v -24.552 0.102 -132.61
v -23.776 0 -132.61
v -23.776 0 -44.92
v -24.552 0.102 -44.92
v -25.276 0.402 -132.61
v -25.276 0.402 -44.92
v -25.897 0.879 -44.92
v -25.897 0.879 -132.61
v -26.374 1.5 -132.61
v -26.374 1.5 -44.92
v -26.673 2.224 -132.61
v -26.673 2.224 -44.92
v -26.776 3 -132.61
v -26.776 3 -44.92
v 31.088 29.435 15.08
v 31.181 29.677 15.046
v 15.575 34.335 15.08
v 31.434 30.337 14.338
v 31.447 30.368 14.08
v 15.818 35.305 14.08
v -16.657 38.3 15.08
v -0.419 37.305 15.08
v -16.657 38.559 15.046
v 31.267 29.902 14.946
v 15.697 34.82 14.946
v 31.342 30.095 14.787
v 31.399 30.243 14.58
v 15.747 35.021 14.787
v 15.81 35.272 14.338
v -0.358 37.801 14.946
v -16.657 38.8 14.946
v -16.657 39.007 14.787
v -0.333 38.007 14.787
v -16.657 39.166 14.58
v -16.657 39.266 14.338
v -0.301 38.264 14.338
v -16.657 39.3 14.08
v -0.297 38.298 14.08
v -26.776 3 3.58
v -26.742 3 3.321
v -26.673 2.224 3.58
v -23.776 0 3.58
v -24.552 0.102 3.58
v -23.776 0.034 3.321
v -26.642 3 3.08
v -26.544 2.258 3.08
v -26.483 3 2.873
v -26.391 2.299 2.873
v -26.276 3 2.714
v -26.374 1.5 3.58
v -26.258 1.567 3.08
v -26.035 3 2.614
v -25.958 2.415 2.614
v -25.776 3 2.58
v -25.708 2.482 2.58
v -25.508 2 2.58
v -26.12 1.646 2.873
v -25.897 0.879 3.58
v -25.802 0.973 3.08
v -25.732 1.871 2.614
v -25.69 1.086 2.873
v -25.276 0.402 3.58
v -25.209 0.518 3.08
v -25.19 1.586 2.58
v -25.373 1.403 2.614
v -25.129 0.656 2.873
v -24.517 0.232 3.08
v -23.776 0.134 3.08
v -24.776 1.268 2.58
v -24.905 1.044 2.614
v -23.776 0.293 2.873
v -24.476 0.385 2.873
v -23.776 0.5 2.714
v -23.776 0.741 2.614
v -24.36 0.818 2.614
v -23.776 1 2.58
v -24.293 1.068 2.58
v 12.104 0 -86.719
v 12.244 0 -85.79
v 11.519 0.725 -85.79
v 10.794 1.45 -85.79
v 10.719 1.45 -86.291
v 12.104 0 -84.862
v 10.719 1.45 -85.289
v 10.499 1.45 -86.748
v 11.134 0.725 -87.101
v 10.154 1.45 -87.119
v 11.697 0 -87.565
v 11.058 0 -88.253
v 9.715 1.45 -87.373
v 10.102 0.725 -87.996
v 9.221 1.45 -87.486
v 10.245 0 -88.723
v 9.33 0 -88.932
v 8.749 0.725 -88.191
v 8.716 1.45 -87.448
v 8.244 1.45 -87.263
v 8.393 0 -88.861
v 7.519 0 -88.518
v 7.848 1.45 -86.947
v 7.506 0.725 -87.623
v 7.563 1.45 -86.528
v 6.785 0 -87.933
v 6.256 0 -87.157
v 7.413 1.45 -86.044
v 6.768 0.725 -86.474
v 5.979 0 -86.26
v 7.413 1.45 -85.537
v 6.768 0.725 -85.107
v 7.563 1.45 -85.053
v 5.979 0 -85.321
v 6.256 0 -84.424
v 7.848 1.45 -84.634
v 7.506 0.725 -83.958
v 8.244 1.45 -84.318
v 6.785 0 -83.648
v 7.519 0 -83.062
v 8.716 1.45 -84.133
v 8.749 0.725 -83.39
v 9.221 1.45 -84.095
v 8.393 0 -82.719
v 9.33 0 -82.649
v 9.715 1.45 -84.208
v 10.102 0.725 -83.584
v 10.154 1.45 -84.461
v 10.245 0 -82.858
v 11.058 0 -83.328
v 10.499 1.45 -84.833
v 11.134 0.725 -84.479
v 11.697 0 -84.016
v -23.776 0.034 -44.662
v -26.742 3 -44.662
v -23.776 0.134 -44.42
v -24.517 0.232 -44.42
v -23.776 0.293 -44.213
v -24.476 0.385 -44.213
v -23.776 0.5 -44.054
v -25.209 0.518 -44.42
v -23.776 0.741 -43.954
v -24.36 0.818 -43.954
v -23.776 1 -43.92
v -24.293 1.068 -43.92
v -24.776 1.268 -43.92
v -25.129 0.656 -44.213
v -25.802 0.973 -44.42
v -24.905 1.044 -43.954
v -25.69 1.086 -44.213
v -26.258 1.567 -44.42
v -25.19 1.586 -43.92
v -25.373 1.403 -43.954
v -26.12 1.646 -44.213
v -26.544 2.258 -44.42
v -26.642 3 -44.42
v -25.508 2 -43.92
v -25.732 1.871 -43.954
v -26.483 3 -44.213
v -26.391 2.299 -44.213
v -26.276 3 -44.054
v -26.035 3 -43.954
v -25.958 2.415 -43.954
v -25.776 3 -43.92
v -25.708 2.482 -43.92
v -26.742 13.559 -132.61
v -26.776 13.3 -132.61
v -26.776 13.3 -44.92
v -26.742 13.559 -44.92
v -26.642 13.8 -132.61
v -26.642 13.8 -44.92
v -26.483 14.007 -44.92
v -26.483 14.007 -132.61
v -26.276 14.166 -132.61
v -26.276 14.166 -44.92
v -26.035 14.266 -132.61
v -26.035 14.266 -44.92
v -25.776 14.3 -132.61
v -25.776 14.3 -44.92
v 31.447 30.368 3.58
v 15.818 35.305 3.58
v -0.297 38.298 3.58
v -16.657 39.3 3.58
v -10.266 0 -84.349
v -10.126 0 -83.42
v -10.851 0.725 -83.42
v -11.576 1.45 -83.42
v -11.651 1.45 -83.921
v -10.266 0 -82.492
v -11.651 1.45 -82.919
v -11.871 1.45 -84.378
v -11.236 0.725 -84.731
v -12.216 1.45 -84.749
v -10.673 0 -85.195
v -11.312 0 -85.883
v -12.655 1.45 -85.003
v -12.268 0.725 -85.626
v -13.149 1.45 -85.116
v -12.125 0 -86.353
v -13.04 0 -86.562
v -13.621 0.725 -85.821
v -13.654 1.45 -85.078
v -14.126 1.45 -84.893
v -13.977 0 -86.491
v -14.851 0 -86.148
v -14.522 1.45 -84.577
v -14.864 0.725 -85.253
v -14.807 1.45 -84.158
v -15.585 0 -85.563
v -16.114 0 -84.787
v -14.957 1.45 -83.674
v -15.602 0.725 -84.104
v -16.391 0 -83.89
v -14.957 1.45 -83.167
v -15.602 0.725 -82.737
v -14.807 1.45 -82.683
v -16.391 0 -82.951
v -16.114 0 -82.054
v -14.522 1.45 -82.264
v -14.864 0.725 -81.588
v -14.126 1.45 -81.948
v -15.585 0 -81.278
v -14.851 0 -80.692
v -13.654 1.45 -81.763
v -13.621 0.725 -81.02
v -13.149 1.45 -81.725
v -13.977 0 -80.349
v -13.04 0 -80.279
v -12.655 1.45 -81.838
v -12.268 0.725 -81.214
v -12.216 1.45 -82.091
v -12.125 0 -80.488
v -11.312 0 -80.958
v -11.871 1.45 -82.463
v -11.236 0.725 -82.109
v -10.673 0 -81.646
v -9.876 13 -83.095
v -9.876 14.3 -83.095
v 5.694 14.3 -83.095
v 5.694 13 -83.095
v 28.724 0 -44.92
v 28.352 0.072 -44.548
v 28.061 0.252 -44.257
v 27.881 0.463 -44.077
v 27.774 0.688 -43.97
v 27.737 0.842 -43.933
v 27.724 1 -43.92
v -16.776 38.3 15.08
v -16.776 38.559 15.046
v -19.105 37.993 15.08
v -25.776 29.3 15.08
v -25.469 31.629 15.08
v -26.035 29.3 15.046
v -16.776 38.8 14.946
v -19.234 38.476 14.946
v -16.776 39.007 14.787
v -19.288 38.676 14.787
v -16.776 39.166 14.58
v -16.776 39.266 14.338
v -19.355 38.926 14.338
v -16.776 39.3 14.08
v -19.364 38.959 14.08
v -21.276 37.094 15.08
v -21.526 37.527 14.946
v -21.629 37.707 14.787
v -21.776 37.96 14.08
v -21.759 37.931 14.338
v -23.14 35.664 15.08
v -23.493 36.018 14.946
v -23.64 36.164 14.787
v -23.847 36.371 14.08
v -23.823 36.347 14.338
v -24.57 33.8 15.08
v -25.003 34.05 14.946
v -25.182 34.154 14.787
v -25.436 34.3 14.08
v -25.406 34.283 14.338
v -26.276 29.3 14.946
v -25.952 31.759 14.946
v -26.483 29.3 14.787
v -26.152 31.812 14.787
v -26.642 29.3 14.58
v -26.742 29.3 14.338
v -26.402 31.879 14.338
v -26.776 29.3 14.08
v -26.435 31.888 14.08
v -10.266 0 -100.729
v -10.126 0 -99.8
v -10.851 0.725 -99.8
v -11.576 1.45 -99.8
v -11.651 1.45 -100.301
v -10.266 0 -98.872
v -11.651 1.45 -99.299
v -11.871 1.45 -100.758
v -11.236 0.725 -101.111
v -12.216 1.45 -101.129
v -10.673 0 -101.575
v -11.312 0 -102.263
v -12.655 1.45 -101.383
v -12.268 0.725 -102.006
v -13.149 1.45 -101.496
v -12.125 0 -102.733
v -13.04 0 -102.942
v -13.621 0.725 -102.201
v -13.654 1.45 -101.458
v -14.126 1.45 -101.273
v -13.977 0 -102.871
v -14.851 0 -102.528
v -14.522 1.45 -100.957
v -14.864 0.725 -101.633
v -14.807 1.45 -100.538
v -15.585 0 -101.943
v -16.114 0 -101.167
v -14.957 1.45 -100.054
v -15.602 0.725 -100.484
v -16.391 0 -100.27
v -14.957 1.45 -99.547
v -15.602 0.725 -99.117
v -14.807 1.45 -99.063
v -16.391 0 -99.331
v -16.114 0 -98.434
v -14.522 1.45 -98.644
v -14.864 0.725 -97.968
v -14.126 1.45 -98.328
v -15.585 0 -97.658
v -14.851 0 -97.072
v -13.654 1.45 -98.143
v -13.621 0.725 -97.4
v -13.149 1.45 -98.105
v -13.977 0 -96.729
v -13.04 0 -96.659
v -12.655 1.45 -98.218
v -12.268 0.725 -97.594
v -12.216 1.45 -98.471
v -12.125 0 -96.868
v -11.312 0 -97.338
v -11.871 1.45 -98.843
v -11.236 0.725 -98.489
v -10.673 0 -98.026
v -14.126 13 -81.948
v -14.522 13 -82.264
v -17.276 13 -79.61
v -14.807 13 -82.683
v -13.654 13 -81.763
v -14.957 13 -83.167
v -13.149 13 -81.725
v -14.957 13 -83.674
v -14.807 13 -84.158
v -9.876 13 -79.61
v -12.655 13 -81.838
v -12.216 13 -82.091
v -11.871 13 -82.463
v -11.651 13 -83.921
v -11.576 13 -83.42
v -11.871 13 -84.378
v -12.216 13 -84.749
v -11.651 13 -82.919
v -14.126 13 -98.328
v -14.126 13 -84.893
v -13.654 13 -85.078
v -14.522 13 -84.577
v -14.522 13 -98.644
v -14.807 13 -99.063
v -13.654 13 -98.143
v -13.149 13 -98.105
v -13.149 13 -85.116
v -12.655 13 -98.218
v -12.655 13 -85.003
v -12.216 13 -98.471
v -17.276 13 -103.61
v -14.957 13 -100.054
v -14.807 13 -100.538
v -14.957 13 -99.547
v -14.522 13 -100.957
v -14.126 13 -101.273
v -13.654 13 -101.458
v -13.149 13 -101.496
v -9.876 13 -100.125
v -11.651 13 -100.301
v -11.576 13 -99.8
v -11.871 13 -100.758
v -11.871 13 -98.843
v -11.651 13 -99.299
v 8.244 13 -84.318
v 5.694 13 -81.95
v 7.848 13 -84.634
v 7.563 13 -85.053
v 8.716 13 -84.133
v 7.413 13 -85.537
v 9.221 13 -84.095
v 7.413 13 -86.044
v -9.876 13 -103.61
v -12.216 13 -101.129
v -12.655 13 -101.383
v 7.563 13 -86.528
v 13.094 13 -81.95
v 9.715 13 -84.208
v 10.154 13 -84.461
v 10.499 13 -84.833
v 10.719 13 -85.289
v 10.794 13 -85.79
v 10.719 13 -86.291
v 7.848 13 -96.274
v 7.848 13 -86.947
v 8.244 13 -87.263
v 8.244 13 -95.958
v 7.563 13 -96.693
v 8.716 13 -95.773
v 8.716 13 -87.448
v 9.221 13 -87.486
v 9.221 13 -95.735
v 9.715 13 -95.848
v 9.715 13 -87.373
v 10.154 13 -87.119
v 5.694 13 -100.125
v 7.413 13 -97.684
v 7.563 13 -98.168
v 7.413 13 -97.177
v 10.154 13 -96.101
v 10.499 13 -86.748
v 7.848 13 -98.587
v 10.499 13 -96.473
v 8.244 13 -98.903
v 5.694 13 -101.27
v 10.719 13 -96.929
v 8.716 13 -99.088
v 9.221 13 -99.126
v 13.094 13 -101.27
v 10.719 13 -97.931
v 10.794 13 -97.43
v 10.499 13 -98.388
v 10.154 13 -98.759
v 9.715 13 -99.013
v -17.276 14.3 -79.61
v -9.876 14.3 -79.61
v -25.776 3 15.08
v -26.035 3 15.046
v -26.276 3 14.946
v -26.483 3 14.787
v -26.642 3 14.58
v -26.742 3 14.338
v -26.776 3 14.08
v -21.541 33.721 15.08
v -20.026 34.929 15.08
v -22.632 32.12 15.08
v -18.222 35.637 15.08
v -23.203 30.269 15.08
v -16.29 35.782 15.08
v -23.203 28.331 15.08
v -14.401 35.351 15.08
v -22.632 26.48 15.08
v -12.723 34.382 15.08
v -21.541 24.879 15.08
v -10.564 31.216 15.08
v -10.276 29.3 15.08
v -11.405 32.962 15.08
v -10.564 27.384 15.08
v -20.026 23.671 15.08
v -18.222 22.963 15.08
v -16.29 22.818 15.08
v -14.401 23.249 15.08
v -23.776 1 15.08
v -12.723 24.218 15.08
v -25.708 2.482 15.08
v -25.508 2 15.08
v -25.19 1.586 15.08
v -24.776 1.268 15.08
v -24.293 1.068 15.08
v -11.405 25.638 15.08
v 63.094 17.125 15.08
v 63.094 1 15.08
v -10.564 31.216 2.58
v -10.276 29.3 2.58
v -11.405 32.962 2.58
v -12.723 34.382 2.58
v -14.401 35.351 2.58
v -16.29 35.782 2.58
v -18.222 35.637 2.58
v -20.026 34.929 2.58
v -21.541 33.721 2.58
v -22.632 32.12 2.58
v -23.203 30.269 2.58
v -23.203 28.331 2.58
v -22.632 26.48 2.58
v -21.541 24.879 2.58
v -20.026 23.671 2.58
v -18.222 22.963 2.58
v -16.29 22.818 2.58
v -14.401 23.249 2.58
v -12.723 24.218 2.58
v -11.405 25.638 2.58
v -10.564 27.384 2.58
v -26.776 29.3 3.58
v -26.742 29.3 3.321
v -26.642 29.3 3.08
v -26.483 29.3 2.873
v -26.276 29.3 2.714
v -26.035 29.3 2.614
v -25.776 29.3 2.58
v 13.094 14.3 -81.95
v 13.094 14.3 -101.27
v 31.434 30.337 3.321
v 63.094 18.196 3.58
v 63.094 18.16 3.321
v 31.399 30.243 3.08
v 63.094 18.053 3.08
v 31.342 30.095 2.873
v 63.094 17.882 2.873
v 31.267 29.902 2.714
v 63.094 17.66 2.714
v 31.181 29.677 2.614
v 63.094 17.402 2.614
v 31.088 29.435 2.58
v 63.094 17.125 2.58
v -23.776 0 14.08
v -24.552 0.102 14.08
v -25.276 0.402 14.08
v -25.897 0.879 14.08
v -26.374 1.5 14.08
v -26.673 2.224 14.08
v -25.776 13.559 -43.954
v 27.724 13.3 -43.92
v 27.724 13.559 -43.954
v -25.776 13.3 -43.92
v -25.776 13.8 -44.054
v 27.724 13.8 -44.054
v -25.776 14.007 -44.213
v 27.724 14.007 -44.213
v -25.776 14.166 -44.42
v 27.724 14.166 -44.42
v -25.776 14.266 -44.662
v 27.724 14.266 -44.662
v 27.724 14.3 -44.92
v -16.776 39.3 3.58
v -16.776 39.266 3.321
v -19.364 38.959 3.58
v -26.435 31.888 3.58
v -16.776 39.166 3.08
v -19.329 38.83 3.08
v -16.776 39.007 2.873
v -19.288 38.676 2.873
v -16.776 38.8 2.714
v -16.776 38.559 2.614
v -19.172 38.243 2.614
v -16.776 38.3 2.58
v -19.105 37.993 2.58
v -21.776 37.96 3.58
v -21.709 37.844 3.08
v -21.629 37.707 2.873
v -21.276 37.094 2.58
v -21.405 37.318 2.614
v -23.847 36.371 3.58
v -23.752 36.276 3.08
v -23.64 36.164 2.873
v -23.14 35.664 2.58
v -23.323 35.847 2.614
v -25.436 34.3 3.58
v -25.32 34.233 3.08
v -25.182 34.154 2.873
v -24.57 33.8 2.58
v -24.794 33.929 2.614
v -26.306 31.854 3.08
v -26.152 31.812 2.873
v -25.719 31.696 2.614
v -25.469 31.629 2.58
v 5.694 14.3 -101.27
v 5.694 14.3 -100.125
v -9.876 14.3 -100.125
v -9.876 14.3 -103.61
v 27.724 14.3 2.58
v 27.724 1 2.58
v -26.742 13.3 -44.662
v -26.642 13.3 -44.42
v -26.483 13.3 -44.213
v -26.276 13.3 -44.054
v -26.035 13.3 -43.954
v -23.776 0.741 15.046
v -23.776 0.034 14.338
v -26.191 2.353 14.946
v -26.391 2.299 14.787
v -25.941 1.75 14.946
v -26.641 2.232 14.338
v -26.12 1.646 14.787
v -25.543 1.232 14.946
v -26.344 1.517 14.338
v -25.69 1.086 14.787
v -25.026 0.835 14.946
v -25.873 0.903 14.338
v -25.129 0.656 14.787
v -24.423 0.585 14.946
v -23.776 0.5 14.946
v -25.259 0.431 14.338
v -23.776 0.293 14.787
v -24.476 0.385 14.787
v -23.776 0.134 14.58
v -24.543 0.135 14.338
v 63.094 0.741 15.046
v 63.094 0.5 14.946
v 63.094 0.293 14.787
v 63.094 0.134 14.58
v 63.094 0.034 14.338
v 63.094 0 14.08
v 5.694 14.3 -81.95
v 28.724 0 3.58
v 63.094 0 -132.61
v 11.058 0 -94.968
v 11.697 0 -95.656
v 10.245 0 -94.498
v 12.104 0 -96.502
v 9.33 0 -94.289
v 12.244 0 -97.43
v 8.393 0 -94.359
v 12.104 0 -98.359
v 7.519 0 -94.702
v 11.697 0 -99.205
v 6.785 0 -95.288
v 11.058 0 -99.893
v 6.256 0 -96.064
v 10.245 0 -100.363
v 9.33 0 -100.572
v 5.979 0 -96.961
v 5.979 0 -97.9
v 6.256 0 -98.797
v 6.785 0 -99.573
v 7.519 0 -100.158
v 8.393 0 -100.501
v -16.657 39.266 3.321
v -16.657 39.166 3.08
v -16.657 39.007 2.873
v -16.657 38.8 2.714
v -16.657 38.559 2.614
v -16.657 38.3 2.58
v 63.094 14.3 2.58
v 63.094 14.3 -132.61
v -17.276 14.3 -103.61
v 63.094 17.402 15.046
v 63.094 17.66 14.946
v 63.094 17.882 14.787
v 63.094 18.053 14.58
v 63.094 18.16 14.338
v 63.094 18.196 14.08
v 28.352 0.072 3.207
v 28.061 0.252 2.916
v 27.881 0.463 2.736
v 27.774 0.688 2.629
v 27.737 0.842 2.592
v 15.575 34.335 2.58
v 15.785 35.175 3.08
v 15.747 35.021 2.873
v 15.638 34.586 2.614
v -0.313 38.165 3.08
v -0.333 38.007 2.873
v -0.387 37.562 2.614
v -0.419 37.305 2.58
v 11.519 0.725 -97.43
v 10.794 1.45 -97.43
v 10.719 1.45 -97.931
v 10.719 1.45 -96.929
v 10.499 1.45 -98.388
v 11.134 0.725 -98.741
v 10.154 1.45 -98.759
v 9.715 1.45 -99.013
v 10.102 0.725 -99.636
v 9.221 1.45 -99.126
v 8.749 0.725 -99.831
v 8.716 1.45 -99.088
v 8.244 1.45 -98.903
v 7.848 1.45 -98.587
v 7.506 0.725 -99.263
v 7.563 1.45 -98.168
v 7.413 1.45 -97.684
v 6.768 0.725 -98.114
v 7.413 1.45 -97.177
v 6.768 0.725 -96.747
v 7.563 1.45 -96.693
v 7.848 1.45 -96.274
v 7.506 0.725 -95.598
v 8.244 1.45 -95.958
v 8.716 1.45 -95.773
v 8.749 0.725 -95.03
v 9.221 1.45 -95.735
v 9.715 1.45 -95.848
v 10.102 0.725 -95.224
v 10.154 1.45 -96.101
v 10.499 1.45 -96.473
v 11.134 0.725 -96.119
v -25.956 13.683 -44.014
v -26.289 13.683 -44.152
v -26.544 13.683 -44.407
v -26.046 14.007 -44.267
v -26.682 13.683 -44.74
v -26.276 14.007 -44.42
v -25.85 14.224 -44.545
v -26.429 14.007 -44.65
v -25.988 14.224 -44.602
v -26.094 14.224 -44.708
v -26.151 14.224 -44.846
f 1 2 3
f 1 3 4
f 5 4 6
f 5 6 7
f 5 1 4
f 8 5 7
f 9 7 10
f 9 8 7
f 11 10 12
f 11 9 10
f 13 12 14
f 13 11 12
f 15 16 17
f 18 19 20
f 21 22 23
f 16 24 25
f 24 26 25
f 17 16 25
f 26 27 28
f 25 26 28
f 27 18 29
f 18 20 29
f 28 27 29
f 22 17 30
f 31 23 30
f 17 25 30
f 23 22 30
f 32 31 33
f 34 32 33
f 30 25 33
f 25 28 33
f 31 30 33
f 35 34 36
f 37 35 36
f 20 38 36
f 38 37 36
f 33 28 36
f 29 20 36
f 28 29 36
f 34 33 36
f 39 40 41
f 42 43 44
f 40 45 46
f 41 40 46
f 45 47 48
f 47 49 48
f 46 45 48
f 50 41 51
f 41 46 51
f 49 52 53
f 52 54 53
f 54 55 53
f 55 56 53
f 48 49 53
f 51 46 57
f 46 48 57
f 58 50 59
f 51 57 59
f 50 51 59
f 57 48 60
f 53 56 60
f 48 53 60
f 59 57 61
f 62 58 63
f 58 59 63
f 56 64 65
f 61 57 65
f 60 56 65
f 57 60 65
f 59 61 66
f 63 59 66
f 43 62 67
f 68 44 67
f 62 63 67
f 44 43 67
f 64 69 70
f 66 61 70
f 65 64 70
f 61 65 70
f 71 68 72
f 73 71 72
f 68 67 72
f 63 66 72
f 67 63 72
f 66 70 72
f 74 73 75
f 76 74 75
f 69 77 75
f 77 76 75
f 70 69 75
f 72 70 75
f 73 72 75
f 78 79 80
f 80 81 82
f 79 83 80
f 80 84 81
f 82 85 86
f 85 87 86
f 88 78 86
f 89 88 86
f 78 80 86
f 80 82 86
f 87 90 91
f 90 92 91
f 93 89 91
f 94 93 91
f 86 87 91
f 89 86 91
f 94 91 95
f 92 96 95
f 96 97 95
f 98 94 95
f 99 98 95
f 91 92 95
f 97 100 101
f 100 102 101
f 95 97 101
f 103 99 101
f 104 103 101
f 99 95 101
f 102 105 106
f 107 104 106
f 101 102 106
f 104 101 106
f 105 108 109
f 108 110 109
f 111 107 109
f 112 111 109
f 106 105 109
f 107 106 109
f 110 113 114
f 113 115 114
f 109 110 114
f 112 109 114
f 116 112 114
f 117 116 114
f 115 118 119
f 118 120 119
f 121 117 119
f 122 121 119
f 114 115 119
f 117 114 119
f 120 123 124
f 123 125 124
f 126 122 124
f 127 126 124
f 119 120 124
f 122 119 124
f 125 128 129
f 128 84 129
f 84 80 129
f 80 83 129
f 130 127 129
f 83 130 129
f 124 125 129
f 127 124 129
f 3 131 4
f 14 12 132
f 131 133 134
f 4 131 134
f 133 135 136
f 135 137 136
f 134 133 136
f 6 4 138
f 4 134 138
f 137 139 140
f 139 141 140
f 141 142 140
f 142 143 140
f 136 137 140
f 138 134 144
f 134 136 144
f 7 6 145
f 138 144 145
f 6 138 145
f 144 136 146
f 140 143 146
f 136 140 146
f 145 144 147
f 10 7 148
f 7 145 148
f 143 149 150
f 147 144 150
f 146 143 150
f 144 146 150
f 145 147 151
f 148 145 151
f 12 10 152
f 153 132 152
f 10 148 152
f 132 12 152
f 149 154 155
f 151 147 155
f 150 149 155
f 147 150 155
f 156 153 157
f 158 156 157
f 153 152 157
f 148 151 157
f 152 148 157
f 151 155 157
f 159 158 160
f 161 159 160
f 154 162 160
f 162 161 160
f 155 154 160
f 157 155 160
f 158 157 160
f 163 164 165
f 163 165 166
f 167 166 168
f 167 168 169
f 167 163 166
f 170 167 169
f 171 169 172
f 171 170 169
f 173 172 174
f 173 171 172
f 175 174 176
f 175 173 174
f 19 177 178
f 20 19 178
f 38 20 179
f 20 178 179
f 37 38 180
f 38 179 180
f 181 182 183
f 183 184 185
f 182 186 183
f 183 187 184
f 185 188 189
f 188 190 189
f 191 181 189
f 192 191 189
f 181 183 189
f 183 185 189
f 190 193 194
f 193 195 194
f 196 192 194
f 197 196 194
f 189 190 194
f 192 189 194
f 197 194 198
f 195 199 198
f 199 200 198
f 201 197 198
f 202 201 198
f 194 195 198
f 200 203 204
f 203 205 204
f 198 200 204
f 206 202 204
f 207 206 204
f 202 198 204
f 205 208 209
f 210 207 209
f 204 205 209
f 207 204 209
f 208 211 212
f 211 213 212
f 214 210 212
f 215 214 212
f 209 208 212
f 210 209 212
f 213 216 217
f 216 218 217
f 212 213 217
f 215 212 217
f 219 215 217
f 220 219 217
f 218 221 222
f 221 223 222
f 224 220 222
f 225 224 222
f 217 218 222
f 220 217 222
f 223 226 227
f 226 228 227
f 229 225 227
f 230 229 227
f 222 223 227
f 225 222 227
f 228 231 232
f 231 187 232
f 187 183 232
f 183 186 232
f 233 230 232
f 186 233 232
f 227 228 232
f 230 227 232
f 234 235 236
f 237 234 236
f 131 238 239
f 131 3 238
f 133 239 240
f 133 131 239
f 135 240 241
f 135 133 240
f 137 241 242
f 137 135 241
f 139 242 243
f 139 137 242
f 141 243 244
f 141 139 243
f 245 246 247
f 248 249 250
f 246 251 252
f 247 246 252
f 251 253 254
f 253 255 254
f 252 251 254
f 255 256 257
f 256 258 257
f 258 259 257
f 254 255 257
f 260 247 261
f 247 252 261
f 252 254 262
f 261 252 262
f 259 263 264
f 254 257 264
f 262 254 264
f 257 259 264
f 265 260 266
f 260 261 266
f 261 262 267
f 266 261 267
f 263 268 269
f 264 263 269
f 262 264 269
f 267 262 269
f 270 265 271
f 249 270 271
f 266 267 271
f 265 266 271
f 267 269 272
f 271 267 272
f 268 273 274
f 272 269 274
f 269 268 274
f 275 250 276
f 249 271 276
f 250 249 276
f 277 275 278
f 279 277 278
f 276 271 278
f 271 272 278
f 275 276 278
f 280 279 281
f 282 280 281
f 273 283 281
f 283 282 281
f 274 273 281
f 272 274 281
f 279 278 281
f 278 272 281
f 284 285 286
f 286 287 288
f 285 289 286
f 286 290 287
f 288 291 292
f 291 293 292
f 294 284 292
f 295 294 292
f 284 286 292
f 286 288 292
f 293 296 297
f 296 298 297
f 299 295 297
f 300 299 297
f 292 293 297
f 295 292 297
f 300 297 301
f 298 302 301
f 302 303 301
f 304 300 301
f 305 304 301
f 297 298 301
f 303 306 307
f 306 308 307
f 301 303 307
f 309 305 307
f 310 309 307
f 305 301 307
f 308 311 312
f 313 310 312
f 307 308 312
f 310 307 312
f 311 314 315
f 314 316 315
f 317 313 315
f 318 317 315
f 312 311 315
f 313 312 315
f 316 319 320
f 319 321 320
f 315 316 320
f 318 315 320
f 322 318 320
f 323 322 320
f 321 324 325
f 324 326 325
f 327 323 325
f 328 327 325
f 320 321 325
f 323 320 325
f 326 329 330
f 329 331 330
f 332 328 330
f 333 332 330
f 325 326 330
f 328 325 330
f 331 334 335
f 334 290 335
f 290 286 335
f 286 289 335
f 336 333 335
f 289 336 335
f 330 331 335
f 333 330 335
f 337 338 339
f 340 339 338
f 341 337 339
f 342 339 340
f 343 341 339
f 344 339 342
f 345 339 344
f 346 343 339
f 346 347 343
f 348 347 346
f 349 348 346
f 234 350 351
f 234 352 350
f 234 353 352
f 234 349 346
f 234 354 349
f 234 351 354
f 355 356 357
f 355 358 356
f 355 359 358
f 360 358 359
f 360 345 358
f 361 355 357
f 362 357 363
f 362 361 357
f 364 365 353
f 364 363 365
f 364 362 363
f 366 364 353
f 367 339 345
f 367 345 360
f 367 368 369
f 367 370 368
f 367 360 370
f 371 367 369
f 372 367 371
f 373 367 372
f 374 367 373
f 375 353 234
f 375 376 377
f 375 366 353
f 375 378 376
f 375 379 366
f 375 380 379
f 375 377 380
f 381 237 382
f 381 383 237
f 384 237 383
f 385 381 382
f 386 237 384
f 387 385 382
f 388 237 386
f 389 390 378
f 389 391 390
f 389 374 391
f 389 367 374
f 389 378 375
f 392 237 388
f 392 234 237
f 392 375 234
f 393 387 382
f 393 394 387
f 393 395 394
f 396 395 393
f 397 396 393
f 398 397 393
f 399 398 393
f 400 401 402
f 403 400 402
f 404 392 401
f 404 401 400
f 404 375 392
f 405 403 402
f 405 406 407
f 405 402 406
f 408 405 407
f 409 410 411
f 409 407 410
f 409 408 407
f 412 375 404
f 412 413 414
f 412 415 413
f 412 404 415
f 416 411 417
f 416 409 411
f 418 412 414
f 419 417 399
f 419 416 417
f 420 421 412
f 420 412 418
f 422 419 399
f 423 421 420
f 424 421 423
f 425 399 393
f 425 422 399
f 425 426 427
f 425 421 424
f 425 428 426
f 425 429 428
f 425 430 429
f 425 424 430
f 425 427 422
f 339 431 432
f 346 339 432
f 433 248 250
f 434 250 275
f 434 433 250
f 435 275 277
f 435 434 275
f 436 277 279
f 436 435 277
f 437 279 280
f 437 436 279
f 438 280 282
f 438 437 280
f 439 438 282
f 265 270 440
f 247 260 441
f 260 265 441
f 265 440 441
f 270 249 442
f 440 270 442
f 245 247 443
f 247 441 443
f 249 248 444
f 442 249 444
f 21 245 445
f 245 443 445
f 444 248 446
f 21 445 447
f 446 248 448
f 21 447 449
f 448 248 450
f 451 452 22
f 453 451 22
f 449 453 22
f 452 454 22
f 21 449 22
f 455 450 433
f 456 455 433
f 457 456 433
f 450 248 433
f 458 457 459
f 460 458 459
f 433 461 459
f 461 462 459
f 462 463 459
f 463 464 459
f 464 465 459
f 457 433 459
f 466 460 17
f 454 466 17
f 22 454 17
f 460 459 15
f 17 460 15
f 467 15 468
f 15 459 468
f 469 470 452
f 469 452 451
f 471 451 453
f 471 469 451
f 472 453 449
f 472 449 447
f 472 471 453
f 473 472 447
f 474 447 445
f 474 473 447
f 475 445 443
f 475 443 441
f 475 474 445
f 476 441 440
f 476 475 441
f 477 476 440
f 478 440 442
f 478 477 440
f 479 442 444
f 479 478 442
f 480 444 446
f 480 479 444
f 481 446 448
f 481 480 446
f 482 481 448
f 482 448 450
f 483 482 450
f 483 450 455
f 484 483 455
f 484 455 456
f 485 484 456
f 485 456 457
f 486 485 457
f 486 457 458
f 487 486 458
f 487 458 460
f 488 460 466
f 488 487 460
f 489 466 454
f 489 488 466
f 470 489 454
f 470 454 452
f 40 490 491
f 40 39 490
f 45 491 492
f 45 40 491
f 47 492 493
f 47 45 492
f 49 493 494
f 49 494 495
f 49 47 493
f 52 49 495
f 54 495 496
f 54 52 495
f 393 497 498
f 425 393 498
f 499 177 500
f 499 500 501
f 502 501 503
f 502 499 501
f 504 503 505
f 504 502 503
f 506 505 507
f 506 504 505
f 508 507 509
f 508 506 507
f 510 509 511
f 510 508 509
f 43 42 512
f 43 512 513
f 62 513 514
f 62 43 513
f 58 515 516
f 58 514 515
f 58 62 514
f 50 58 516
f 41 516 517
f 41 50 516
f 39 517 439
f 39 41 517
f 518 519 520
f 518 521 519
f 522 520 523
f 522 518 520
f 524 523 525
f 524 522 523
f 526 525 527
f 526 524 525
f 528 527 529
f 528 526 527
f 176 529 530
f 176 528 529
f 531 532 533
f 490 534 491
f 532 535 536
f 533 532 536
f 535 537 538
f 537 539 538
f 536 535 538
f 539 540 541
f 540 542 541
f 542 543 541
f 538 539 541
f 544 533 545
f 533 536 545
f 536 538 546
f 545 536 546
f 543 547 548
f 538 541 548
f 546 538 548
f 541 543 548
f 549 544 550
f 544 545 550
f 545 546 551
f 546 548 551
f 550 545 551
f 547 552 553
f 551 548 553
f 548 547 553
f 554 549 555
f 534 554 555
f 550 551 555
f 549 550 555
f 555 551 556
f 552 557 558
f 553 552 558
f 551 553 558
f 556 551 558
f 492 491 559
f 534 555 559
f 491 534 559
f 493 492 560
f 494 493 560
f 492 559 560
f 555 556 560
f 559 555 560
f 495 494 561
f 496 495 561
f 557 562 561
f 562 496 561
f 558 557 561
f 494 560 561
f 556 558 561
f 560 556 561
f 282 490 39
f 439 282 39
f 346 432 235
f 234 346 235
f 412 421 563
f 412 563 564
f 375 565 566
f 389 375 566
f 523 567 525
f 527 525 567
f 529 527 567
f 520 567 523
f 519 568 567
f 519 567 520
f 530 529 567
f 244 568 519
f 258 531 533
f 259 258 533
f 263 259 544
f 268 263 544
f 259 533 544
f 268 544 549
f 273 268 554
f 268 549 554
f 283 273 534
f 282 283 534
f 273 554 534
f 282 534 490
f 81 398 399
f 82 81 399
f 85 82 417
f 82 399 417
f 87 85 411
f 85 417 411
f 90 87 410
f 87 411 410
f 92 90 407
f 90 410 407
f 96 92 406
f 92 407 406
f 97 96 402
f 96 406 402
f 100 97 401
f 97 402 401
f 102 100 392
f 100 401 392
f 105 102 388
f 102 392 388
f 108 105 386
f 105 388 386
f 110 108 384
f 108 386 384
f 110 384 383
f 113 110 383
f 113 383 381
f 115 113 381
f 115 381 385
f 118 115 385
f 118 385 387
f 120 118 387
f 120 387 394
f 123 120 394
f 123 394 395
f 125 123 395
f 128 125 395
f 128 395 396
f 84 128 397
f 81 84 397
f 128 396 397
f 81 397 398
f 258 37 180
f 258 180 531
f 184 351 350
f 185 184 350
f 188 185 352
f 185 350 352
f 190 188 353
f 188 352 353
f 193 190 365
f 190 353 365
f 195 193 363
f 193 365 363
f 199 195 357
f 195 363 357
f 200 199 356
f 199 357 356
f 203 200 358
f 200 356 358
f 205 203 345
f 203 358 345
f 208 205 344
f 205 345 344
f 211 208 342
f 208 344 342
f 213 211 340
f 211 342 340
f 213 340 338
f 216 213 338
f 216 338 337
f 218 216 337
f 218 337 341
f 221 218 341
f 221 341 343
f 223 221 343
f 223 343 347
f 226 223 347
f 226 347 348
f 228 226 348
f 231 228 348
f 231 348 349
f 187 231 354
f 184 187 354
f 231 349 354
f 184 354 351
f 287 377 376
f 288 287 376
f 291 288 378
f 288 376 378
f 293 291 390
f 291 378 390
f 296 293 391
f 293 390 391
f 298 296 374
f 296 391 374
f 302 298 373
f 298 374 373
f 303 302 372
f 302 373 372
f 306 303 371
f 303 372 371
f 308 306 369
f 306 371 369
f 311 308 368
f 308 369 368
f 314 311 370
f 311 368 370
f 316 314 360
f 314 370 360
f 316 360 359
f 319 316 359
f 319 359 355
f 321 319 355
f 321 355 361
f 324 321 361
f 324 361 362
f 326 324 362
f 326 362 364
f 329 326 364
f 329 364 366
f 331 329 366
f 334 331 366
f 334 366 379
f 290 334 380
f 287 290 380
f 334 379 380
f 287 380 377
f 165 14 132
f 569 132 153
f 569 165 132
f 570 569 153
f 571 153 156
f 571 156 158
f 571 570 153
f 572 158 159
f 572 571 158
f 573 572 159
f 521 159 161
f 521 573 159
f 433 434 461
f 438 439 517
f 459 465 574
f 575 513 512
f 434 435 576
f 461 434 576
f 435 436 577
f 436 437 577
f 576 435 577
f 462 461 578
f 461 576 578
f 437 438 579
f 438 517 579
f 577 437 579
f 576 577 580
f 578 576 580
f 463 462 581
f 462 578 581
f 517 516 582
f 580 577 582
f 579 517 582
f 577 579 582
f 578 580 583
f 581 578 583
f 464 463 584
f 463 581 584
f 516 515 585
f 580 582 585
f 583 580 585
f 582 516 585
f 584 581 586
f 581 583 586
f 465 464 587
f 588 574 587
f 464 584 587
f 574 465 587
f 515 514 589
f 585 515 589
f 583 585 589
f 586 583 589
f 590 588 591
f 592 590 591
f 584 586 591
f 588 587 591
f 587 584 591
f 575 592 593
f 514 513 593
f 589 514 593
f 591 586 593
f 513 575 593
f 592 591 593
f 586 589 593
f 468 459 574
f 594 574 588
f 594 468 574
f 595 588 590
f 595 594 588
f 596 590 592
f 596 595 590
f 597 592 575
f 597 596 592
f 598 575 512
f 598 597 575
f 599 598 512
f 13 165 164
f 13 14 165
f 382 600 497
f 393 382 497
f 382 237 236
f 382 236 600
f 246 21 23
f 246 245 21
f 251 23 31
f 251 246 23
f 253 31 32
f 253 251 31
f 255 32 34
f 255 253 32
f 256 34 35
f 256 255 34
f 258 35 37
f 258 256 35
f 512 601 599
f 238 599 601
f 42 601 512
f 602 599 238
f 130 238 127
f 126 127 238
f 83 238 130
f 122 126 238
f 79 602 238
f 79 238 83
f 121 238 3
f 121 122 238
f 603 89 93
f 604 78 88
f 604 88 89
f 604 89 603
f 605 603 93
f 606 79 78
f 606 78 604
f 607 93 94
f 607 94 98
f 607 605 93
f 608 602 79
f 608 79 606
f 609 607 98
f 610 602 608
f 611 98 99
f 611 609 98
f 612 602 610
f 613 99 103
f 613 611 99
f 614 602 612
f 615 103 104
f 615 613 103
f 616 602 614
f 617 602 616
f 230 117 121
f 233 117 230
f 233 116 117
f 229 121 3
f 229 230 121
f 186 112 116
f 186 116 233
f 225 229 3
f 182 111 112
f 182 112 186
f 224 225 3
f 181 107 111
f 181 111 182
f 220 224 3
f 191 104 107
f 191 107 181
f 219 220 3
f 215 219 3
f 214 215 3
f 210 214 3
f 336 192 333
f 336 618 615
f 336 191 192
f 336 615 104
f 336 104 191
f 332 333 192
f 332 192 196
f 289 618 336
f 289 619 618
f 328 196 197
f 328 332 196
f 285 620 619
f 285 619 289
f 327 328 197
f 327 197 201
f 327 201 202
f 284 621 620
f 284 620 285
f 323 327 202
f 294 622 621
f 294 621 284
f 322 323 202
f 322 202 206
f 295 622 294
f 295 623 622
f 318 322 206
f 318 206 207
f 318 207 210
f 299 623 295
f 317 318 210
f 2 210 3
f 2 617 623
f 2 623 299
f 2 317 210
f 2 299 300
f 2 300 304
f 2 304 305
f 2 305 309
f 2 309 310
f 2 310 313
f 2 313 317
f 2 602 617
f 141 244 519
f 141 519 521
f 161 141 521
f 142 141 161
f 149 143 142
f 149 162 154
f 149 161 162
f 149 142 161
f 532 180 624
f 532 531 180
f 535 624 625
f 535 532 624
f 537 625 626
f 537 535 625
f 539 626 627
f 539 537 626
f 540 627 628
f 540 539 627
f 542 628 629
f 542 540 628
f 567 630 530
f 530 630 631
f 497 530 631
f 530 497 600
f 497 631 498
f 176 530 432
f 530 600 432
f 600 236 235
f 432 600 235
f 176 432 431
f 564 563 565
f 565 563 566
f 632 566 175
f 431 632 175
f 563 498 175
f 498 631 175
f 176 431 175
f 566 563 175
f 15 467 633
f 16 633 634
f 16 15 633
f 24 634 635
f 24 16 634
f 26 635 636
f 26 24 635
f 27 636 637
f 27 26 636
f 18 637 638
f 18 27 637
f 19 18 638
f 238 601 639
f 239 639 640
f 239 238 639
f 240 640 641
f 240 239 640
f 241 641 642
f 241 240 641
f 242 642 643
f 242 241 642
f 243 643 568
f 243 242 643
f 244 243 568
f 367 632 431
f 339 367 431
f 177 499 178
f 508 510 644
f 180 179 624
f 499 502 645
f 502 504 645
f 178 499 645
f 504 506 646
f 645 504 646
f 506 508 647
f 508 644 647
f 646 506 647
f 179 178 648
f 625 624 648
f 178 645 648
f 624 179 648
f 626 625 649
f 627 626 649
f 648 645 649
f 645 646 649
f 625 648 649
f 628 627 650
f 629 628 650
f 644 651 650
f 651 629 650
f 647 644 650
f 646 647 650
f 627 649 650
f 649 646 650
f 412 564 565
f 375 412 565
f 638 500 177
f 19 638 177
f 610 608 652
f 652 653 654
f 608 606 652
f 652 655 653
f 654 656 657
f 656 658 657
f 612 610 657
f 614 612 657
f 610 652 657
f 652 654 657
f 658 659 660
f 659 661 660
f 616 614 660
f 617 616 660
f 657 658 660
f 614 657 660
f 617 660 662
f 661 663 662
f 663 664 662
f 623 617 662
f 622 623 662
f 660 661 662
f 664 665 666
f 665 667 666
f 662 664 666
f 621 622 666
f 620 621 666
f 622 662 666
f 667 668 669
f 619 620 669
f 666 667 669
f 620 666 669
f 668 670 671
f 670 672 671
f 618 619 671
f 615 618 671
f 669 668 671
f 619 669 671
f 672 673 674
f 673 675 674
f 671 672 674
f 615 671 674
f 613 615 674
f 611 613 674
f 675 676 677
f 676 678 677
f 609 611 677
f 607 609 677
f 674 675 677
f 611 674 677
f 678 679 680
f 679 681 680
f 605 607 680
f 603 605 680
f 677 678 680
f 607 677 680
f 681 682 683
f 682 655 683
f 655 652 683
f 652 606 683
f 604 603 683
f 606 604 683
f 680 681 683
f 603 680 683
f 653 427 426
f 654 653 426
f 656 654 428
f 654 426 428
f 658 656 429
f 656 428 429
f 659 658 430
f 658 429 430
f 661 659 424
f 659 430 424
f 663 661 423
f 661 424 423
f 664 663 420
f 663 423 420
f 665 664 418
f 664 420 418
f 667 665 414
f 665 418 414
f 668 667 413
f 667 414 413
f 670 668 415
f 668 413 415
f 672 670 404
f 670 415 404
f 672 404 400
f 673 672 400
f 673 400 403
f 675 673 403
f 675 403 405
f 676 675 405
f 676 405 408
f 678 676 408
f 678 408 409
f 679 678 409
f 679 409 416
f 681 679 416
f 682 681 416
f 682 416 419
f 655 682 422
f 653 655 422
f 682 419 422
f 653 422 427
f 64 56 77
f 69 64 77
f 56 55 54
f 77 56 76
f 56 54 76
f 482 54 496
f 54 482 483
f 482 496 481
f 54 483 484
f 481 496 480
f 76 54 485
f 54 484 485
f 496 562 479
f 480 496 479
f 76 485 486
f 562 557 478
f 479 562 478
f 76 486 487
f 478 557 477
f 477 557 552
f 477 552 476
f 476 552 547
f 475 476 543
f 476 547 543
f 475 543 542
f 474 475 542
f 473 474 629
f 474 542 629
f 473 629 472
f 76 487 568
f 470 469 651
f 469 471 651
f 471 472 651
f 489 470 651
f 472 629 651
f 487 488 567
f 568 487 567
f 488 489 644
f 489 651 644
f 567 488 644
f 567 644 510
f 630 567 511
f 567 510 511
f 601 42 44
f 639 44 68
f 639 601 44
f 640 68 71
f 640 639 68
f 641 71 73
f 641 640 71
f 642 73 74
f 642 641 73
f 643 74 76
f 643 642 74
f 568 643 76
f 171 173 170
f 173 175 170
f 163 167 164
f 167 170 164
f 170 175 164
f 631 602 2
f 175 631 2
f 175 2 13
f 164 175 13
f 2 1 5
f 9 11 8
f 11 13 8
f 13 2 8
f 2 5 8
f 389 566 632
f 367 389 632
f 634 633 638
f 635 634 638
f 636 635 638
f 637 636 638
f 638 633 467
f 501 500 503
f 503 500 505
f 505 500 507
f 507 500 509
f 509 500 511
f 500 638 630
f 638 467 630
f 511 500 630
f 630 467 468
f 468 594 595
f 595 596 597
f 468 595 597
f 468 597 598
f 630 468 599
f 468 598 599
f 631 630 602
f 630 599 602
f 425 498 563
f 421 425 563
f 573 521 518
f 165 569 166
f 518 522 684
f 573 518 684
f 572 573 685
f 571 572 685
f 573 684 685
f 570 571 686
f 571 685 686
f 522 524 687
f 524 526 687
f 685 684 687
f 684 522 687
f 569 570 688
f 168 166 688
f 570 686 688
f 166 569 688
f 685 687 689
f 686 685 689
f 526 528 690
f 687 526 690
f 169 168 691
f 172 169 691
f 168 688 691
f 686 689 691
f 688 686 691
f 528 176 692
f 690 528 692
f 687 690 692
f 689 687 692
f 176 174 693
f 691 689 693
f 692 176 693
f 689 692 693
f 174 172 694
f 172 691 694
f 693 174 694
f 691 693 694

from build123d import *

# Parameters (mm, degrees)
BOSS_EXTRUDE1_DEPTH                             = 14.3
SKETCH2_R                                       = 1.5
CUT_EXTRUDE1_DEPTH                              = 1.3
CSK_FOR_M3_OVAL_HEAD_MACHINE_SCREW1_D           = 3.4
CSK_FOR_M3_OVAL_HEAD_MACHINE_SCREW1_CSINK_D     = 6.3
CSK_FOR_M3_OVAL_HEAD_MACHINE_SCREW1_CSINK_ANGLE = 90
BOSS_EXTRUDE2_START                             = -12.5
SKETCH8_R                                       = 6.5
BOSS_EXTRUDE2_DEPTH                             = 12.5
SKETCH14_W                                      = 40
SKETCH14_H                                      = 74
BOSS_EXTRUDE4_DEPTH                             = 25
CUT_EXTRUDE3_DEPTH                              = 4
M5_CLEARANCE_HOLE1_D                            = 5.5
FILLET1_R                                       = 4
FILLET1_OF_MIRROR3_R                            = 4
FILLET2_R                                       = 7
FILLET4_R                                       = 3
FILLET5_R                                       = 3
FILLET6_R                                       = 3
FILLET7_R                                       = 1
FILLET8_R                                       = 1
FILLET9_R                                       = 1
FILLET10_R                                      = 1
FILLET11_R                                      = 1
SKETCH21_W                                      = 13
SKETCH21_H                                      = 3.5
BOSS_EXTRUDE5_DEPTH                             = 33
CUT_EXTRUDE4_DEPTH                              = 17
CSK_FOR_M3_FLAT_HEAD_MACHINE_SCREW1_D           = 3.4
CSK_FOR_M3_FLAT_HEAD_MACHINE_SCREW1_CSINK_D     = 6.3
CSK_FOR_M3_FLAT_HEAD_MACHINE_SCREW1_CSINK_ANGLE = 90
CUT_EXTRUDE5_DEPTH                              = 434.079434689


with BuildPart() as part:
    # Sketch1 → Boss-Extrude1 (new body)
    with BuildSketch(Plane(origin=(0, 0, 0), x_dir=(1, 0, 0), z_dir=(0, 1, 0))):
        Polygon((27.724299065, -2.579662371), (27.724299065, 43.920337629), (-26.775700935, 43.920337629), (-26.775700935, 230.920337629), (27.724299065, 230.920337629), (27.724299065, 277.420337629), (-26.775700935, 277.420337629), (-26.775700935, 289.920337629), (318.224299065, 289.920337629), (318.224299065, -15.079662371), (-26.775700935, -15.079662371), (-26.775700935, -2.579662371), align=None)
    extrude(amount=BOSS_EXTRUDE1_DEPTH)

    # Sketch2 → Cut-Extrude1 (cut)
    # profile 1 of 2: a face of its own
    with BuildSketch(Plane(origin=(0, 14.3, 0), x_dir=(1, 0, 0), z_dir=(0, 1, 0))):
        Polygon((5.694299065, 191.745337629), (-9.875700935, 191.745337629), (-9.875700935, 195.230337629), (-17.275700935, 195.230337629), (-17.275700935, 171.230337629), (-9.875700935, 171.230337629), (-9.875700935, 174.715337629), (5.694299065, 174.715337629), (5.694299065, 173.570337629), (13.094299065, 173.570337629), (13.094299065, 192.890337629), (5.694299065, 192.890337629), align=None)
        with Locations(Location((-13.275700935, 191.420337629, 0), (0, 0, 270))):
            Circle(SKETCH2_R, mode=Mode.SUBTRACT)
        with Locations(Location((-13.275700935, 175.040337629, 0), (0, 0, 270))):
            Circle(SKETCH2_R, mode=Mode.SUBTRACT)
        with Locations(Location((9.094299065, 189.050337629, 0), (0, 0, 270))):
            Circle(SKETCH2_R, mode=Mode.SUBTRACT)
        with Locations(Location((9.094299065, 177.410337629, 0), (0, 0, 270))):
            Circle(SKETCH2_R, mode=Mode.SUBTRACT)
    # profile 2 of 2: a face of its own
    with BuildSketch(Plane(origin=(0, 14.3, 0), x_dir=(1, 0, 0), z_dir=(0, 1, 0))):
        Polygon((5.694299065, 100.125337629), (-9.875700935, 100.125337629), (-9.875700935, 103.610337629), (-17.275700935, 103.610337629), (-17.275700935, 79.610337629), (-9.875700935, 79.610337629), (-9.875700935, 83.095337629), (5.694299065, 83.095337629), (5.694299065, 81.950337629), (13.094299065, 81.950337629), (13.094299065, 101.270337629), (5.694299065, 101.270337629), align=None)
        with Locations(Location((-13.275700935, 99.800337629, 0), (0, 0, 270))):
            Circle(SKETCH2_R, mode=Mode.SUBTRACT)
        with Locations(Location((-13.275700935, 83.420337629, 0), (0, 0, 270))):
            Circle(SKETCH2_R, mode=Mode.SUBTRACT)
        with Locations(Location((9.094299065, 97.430337629, 0), (0, 0, 270))):
            Circle(SKETCH2_R, mode=Mode.SUBTRACT)
        with Locations(Location((9.094299065, 85.790337629, 0), (0, 0, 270))):
            Circle(SKETCH2_R, mode=Mode.SUBTRACT)
    extrude(amount=-CUT_EXTRUDE1_DEPTH, mode=Mode.SUBTRACT)

    # CSK for M3 Oval Head Machine Screw1 (through all)
    with Locations(Plane(origin=(0, 0, 0), x_dir=(-1, 0, 0), z_dir=(0, -1, 0))):
        with Locations((13.275700935, 191.420337629), (13.275700935, 175.040337629), (-9.094299065, 177.410337629), (-9.094299065, 189.050337629), (13.275700935, 83.420337629), (13.275700935, 99.800337629), (-9.094299065, 97.430337629), (-9.094299065, 85.790337629)):
            CounterSinkHole(CSK_FOR_M3_OVAL_HEAD_MACHINE_SCREW1_D / 2, CSK_FOR_M3_OVAL_HEAD_MACHINE_SCREW1_CSINK_D / 2, counter_sink_angle=CSK_FOR_M3_OVAL_HEAD_MACHINE_SCREW1_CSINK_ANGLE)

    # Sketch8 → Boss-Extrude2 (add)
    with BuildSketch(Plane.XY.offset(15.079662371).offset(BOSS_EXTRUDE2_START)):
        with BuildLine():
            Line((-26.775700935, 14.3), (73.224299065, 14.3))
            Line((73.224299065, 14.3), (31.446689864, 30.368311231))
            ThreePointArc((31.446689864, 30.368311231), (7.806182122, 37.048156923), (-16.656506763, 39.3))
            Line((-16.656506763, 39.3), (-16.775700935, 39.3))
            ThreePointArc((-16.775700935, 39.3), (-23.846768746, 36.371067812), (-26.775700935, 29.3))
            Line((-26.775700935, 29.3), (-26.775700935, 14.3))
        make_face()
        with Locations((-16.775700935, 29.3)):
            Circle(SKETCH8_R, mode=Mode.SUBTRACT)
    extrude(amount=BOSS_EXTRUDE2_DEPTH)

    # Mirror1: part across plane


with BuildPart() as part_1:
    add(part.part)
    add(part.part.mirror(Plane.XY.offset(-137.420337629)))

    # Sketch14 → Boss-Extrude4 (add)
    with BuildSketch(Plane(origin=(0, 14.3, 0), x_dir=(1, 0, 0), z_dir=(0, 1, 0))):
        with Locations((298.224299065, 21.920337629)):
            Rectangle(SKETCH14_W, SKETCH14_H)
    boss_extrude4 = extrude(amount=BOSS_EXTRUDE4_DEPTH)

    # Sketch15 → Cut-Extrude3 (cut)
    with BuildSketch(Plane(origin=(318.224299065, 0, 0), x_dir=(0, 0, -1), z_dir=(1, 0, 0))):
        Polygon((1.920337629, 24.103847577), (6.420337629, 26.701923789), (6.420337629, 31.898076211), (1.920337629, 34.496152423), (-2.579662371, 31.898076211), (-2.579662371, 26.701923789), align=None)
        Polygon((41.920337629, 24.103847577), (46.420337629, 26.701923789), (46.420337629, 31.898076211), (41.920337629, 34.496152423), (37.420337629, 31.898076211), (37.420337629, 26.701923789), align=None)
    cut_extrude3 = extrude(amount=-CUT_EXTRUDE3_DEPTH, mode=Mode.SUBTRACT)

    # M5 Clearance Hole1 (through all)
    with Locations(Plane(origin=(314.224299065, 0, 0), x_dir=(0, 0, -1), z_dir=(1, 0, 0))):
        with Locations((1.920337629, 29.3), (41.920337629, 29.3)):
            m5_clearance_hole1 = Hole(M5_CLEARANCE_HOLE1_D / 2)

    # Fillet1
    fillet1_edges = [part_1.edges().sort_by_distance(p)[0] for p in [
        (278.224299065, 39.3, -21.920337629),
    ]]
    fillet(fillet1_edges, radius=FILLET1_R)

    # Mirror3: Boss-Extrude4, Cut-Extrude3, M5 Clearance Hole1 across plane
    add(boss_extrude4.mirror(Plane.XY.offset(-137.420337629)))
    add(cut_extrude3.mirror(Plane.XY.offset(-137.420337629)), mode=Mode.SUBTRACT)
    add(m5_clearance_hole1.mirror(Plane.XY.offset(-137.420337629)), mode=Mode.SUBTRACT)

    # Fillet1 of Mirror3
    fillet1_of_mirror3_edges = [part_1.edges().sort_by_distance(p)[0] for p in [
        (278.224299065, 39.3, -252.920337629),
    ]]
    fillet(fillet1_of_mirror3_edges, radius=FILLET1_OF_MIRROR3_R)

    # Fillet2
    fillet2_edges = [part_1.edges().sort_by_distance(p)[0] for p in [
        (318.224299065, 0, -137.420337629),
    ]]
    fillet(fillet2_edges, radius=FILLET2_R)

    # Fillet4
    fillet4_edges = [part_1.edges().sort_by_distance(p)[0] for p in [
        (-26.775700935, 0, -137.420337629),
    ]]
    fillet(fillet4_edges, radius=FILLET4_R)

    # Fillet5
    fillet5_edges = [part_1.edges().sort_by_distance(p)[0] for p in [
        (-26.775700935, 0, 8.829662371),
    ]]
    fillet(fillet5_edges, radius=FILLET5_R)

    # Fillet6
    fillet6_edges = [part_1.edges().sort_by_distance(p)[0] for p in [
        (-26.775700935, 0, -283.670337629),
    ]]
    fillet(fillet6_edges, radius=FILLET6_R)

    # Fillet7
    fillet7_edges = [part_1.edges().sort_by_distance(p)[0] for p in [
        (52.335494465, 22.334155616, 15.079662371),
        (7.806182122, 37.048156923, 15.079662371),
        (-16.716103849, 39.3, 15.079662371),
        (-23.846768746, 36.371067812, 15.079662371),
        (318.224299065, 23.15, 15.079662371),
        (-26.775700935, 16.15, 15.079662371),
        (316.174046534, 2.050252532, 15.079662371),
        (143.724299065, 0, 15.079662371),
        (-25.897021278, 0.878679656, 15.079662371),
    ]]
    fillet(fillet7_edges, radius=FILLET7_R)

    # Fillet8
    fillet8_edges = [part_1.edges().sort_by_distance(p)[0] for p in [
        (-26.775700935, 16.15, -289.920337629),
        (318.224299065, 23.15, -289.920337629),
        (-23.846768746, 36.371067812, -289.920337629),
        (-16.716103849, 39.3, -289.920337629),
        (7.806182122, 37.048156923, -289.920337629),
        (52.335494465, 22.334155616, -289.920337629),
        (143.724299065, 0, -289.920337629),
        (316.174046534, 2.050252532, -289.920337629),
        (-25.897021278, 0.878679656, -289.920337629),
    ]]
    fillet(fillet8_edges, radius=FILLET8_R)

    # Fillet9
    fillet9_edges = [part_1.edges().sort_by_distance(p)[0] for p in [
        (27.724299065, 0, -20.670337629),
        (1.974299065, 0, 2.579662371),
        (-26.775700935, 8.65, -43.920337629),
        (-23.846768746, 36.371067812, 2.579662371),
        (-16.716103849, 39.3, 2.579662371),
        (7.806182122, 37.048156923, 2.579662371),
        (52.335494465, 22.334155616, 2.579662371),
        (-26.775700935, 16.15, 2.579662371),
        (1.974299065, 0, -43.920337629),
        (-25.897021278, 0.878679656, -43.920337629),
        (-25.897021278, 0.878679656, 2.579662371),
    ]]
    fillet(fillet9_edges, radius=FILLET9_R)

    # Fillet10
    fillet10_edges = [part_1.edges().sort_by_distance(p)[0] for p in [
        (1.974299065, 0, -230.920337629),
        (27.724299065, 0, -254.170337629),
        (-26.775700935, 8.65, -230.920337629),
        (-26.775700935, 16.15, -277.420337629),
        (52.335494465, 22.334155616, -277.420337629),
        (7.806182122, 37.048156923, -277.420337629),
        (-16.716103849, 39.3, -277.420337629),
        (-23.846768746, 36.371067812, -277.420337629),
        (-25.897021278, 0.878679656, -230.920337629),
        (1.974299065, 0, -277.420337629),
        (-25.897021278, 0.878679656, -277.420337629),
    ]]
    fillet(fillet10_edges, radius=FILLET10_R)

    # Fillet11
    fillet11_edges = [part_1.edges().sort_by_distance(p)[0] for p in [
        (0.974299065, 14.3, -230.920337629),
        (0.974299065, 14.3, -43.920337629),
        (-26.482807716, 14.3, -44.213230848),
        (-26.775700935, 14.3, -137.420337629),
        (-26.482807716, 14.3, -230.62744441),
    ]]
    fillet(fillet11_edges, radius=FILLET11_R)

    # Sketch21 → Boss-Extrude5 (add)
    with BuildSketch(Plane(origin=(0, 14.3, 0), x_dir=(1, 0, 0), z_dir=(0, 1, 0))):
        with Locations((215.599299065, 13.170337629)):
            Rectangle(SKETCH21_W, SKETCH21_H)
        with Locations((215.599299065, 26.670337629)):
            Rectangle(SKETCH21_W, SKETCH21_H)
    boss_extrude5 = extrude(amount=BOSS_EXTRUDE5_DEPTH)

    # Sketch22 → Cut-Extrude4 (cut)
    with BuildSketch(Plane.XY.offset(-11.420337629)):
        with BuildLine():
            Line((209.099299065, 41.3), (209.099299065, 47.3))
            Line((209.099299065, 47.3), (215.599299065, 49.081376358))
            Line((215.599299065, 49.081376358), (222.099299065, 47.3))
            Line((222.099299065, 47.3), (222.099299065, 41.3))
            ThreePointArc((222.099299065, 41.3), (215.599299065, 47.3), (209.099299065, 41.3))
        make_face()
    cut_extrude4 = extrude(amount=-CUT_EXTRUDE4_DEPTH, mode=Mode.SUBTRACT)

    # CSK for M3 Flat Head Machine Screw1 (through all)
    with Locations(Plane.XY.offset(-11.420337629)):
        with Locations((215.594856714, 41.29339707), (185.090080481, 50.471650395), (10.649939144, 122.619059121)):
            csk_for_m3_flat_head_machine_screw1 = CounterSinkHole(CSK_FOR_M3_FLAT_HEAD_MACHINE_SCREW1_D / 2, CSK_FOR_M3_FLAT_HEAD_MACHINE_SCREW1_CSINK_D / 2, counter_sink_angle=CSK_FOR_M3_FLAT_HEAD_MACHINE_SCREW1_CSINK_ANGLE)

    # Mirror4: Boss-Extrude5, Cut-Extrude4, CSK for M3 Flat Head Machine Screw1 across plane
    add(boss_extrude5.mirror(Plane.XY.offset(-137.420337629)))
    add(cut_extrude4.mirror(Plane.XY.offset(-137.420337629)), mode=Mode.SUBTRACT)
    add(csk_for_m3_flat_head_machine_screw1.mirror(Plane.XY.offset(-137.420337629)), mode=Mode.SUBTRACT)

    # only_engine_part → Cut-Extrude5 (cut, through all)
    with BuildSketch(Plane.XZ):
        Polygon((-26.775700935, -289.920337629), (318.224299065, -289.920337629), (318.224299065, 15.079662371), (63.094299065, 15.079662371), (63.094299065, -132.610337629), (-26.775700935, -132.610337629), align=None)
    extrude(amount=-CUT_EXTRUDE5_DEPTH, mode=Mode.SUBTRACT)


solid = part_1.part
